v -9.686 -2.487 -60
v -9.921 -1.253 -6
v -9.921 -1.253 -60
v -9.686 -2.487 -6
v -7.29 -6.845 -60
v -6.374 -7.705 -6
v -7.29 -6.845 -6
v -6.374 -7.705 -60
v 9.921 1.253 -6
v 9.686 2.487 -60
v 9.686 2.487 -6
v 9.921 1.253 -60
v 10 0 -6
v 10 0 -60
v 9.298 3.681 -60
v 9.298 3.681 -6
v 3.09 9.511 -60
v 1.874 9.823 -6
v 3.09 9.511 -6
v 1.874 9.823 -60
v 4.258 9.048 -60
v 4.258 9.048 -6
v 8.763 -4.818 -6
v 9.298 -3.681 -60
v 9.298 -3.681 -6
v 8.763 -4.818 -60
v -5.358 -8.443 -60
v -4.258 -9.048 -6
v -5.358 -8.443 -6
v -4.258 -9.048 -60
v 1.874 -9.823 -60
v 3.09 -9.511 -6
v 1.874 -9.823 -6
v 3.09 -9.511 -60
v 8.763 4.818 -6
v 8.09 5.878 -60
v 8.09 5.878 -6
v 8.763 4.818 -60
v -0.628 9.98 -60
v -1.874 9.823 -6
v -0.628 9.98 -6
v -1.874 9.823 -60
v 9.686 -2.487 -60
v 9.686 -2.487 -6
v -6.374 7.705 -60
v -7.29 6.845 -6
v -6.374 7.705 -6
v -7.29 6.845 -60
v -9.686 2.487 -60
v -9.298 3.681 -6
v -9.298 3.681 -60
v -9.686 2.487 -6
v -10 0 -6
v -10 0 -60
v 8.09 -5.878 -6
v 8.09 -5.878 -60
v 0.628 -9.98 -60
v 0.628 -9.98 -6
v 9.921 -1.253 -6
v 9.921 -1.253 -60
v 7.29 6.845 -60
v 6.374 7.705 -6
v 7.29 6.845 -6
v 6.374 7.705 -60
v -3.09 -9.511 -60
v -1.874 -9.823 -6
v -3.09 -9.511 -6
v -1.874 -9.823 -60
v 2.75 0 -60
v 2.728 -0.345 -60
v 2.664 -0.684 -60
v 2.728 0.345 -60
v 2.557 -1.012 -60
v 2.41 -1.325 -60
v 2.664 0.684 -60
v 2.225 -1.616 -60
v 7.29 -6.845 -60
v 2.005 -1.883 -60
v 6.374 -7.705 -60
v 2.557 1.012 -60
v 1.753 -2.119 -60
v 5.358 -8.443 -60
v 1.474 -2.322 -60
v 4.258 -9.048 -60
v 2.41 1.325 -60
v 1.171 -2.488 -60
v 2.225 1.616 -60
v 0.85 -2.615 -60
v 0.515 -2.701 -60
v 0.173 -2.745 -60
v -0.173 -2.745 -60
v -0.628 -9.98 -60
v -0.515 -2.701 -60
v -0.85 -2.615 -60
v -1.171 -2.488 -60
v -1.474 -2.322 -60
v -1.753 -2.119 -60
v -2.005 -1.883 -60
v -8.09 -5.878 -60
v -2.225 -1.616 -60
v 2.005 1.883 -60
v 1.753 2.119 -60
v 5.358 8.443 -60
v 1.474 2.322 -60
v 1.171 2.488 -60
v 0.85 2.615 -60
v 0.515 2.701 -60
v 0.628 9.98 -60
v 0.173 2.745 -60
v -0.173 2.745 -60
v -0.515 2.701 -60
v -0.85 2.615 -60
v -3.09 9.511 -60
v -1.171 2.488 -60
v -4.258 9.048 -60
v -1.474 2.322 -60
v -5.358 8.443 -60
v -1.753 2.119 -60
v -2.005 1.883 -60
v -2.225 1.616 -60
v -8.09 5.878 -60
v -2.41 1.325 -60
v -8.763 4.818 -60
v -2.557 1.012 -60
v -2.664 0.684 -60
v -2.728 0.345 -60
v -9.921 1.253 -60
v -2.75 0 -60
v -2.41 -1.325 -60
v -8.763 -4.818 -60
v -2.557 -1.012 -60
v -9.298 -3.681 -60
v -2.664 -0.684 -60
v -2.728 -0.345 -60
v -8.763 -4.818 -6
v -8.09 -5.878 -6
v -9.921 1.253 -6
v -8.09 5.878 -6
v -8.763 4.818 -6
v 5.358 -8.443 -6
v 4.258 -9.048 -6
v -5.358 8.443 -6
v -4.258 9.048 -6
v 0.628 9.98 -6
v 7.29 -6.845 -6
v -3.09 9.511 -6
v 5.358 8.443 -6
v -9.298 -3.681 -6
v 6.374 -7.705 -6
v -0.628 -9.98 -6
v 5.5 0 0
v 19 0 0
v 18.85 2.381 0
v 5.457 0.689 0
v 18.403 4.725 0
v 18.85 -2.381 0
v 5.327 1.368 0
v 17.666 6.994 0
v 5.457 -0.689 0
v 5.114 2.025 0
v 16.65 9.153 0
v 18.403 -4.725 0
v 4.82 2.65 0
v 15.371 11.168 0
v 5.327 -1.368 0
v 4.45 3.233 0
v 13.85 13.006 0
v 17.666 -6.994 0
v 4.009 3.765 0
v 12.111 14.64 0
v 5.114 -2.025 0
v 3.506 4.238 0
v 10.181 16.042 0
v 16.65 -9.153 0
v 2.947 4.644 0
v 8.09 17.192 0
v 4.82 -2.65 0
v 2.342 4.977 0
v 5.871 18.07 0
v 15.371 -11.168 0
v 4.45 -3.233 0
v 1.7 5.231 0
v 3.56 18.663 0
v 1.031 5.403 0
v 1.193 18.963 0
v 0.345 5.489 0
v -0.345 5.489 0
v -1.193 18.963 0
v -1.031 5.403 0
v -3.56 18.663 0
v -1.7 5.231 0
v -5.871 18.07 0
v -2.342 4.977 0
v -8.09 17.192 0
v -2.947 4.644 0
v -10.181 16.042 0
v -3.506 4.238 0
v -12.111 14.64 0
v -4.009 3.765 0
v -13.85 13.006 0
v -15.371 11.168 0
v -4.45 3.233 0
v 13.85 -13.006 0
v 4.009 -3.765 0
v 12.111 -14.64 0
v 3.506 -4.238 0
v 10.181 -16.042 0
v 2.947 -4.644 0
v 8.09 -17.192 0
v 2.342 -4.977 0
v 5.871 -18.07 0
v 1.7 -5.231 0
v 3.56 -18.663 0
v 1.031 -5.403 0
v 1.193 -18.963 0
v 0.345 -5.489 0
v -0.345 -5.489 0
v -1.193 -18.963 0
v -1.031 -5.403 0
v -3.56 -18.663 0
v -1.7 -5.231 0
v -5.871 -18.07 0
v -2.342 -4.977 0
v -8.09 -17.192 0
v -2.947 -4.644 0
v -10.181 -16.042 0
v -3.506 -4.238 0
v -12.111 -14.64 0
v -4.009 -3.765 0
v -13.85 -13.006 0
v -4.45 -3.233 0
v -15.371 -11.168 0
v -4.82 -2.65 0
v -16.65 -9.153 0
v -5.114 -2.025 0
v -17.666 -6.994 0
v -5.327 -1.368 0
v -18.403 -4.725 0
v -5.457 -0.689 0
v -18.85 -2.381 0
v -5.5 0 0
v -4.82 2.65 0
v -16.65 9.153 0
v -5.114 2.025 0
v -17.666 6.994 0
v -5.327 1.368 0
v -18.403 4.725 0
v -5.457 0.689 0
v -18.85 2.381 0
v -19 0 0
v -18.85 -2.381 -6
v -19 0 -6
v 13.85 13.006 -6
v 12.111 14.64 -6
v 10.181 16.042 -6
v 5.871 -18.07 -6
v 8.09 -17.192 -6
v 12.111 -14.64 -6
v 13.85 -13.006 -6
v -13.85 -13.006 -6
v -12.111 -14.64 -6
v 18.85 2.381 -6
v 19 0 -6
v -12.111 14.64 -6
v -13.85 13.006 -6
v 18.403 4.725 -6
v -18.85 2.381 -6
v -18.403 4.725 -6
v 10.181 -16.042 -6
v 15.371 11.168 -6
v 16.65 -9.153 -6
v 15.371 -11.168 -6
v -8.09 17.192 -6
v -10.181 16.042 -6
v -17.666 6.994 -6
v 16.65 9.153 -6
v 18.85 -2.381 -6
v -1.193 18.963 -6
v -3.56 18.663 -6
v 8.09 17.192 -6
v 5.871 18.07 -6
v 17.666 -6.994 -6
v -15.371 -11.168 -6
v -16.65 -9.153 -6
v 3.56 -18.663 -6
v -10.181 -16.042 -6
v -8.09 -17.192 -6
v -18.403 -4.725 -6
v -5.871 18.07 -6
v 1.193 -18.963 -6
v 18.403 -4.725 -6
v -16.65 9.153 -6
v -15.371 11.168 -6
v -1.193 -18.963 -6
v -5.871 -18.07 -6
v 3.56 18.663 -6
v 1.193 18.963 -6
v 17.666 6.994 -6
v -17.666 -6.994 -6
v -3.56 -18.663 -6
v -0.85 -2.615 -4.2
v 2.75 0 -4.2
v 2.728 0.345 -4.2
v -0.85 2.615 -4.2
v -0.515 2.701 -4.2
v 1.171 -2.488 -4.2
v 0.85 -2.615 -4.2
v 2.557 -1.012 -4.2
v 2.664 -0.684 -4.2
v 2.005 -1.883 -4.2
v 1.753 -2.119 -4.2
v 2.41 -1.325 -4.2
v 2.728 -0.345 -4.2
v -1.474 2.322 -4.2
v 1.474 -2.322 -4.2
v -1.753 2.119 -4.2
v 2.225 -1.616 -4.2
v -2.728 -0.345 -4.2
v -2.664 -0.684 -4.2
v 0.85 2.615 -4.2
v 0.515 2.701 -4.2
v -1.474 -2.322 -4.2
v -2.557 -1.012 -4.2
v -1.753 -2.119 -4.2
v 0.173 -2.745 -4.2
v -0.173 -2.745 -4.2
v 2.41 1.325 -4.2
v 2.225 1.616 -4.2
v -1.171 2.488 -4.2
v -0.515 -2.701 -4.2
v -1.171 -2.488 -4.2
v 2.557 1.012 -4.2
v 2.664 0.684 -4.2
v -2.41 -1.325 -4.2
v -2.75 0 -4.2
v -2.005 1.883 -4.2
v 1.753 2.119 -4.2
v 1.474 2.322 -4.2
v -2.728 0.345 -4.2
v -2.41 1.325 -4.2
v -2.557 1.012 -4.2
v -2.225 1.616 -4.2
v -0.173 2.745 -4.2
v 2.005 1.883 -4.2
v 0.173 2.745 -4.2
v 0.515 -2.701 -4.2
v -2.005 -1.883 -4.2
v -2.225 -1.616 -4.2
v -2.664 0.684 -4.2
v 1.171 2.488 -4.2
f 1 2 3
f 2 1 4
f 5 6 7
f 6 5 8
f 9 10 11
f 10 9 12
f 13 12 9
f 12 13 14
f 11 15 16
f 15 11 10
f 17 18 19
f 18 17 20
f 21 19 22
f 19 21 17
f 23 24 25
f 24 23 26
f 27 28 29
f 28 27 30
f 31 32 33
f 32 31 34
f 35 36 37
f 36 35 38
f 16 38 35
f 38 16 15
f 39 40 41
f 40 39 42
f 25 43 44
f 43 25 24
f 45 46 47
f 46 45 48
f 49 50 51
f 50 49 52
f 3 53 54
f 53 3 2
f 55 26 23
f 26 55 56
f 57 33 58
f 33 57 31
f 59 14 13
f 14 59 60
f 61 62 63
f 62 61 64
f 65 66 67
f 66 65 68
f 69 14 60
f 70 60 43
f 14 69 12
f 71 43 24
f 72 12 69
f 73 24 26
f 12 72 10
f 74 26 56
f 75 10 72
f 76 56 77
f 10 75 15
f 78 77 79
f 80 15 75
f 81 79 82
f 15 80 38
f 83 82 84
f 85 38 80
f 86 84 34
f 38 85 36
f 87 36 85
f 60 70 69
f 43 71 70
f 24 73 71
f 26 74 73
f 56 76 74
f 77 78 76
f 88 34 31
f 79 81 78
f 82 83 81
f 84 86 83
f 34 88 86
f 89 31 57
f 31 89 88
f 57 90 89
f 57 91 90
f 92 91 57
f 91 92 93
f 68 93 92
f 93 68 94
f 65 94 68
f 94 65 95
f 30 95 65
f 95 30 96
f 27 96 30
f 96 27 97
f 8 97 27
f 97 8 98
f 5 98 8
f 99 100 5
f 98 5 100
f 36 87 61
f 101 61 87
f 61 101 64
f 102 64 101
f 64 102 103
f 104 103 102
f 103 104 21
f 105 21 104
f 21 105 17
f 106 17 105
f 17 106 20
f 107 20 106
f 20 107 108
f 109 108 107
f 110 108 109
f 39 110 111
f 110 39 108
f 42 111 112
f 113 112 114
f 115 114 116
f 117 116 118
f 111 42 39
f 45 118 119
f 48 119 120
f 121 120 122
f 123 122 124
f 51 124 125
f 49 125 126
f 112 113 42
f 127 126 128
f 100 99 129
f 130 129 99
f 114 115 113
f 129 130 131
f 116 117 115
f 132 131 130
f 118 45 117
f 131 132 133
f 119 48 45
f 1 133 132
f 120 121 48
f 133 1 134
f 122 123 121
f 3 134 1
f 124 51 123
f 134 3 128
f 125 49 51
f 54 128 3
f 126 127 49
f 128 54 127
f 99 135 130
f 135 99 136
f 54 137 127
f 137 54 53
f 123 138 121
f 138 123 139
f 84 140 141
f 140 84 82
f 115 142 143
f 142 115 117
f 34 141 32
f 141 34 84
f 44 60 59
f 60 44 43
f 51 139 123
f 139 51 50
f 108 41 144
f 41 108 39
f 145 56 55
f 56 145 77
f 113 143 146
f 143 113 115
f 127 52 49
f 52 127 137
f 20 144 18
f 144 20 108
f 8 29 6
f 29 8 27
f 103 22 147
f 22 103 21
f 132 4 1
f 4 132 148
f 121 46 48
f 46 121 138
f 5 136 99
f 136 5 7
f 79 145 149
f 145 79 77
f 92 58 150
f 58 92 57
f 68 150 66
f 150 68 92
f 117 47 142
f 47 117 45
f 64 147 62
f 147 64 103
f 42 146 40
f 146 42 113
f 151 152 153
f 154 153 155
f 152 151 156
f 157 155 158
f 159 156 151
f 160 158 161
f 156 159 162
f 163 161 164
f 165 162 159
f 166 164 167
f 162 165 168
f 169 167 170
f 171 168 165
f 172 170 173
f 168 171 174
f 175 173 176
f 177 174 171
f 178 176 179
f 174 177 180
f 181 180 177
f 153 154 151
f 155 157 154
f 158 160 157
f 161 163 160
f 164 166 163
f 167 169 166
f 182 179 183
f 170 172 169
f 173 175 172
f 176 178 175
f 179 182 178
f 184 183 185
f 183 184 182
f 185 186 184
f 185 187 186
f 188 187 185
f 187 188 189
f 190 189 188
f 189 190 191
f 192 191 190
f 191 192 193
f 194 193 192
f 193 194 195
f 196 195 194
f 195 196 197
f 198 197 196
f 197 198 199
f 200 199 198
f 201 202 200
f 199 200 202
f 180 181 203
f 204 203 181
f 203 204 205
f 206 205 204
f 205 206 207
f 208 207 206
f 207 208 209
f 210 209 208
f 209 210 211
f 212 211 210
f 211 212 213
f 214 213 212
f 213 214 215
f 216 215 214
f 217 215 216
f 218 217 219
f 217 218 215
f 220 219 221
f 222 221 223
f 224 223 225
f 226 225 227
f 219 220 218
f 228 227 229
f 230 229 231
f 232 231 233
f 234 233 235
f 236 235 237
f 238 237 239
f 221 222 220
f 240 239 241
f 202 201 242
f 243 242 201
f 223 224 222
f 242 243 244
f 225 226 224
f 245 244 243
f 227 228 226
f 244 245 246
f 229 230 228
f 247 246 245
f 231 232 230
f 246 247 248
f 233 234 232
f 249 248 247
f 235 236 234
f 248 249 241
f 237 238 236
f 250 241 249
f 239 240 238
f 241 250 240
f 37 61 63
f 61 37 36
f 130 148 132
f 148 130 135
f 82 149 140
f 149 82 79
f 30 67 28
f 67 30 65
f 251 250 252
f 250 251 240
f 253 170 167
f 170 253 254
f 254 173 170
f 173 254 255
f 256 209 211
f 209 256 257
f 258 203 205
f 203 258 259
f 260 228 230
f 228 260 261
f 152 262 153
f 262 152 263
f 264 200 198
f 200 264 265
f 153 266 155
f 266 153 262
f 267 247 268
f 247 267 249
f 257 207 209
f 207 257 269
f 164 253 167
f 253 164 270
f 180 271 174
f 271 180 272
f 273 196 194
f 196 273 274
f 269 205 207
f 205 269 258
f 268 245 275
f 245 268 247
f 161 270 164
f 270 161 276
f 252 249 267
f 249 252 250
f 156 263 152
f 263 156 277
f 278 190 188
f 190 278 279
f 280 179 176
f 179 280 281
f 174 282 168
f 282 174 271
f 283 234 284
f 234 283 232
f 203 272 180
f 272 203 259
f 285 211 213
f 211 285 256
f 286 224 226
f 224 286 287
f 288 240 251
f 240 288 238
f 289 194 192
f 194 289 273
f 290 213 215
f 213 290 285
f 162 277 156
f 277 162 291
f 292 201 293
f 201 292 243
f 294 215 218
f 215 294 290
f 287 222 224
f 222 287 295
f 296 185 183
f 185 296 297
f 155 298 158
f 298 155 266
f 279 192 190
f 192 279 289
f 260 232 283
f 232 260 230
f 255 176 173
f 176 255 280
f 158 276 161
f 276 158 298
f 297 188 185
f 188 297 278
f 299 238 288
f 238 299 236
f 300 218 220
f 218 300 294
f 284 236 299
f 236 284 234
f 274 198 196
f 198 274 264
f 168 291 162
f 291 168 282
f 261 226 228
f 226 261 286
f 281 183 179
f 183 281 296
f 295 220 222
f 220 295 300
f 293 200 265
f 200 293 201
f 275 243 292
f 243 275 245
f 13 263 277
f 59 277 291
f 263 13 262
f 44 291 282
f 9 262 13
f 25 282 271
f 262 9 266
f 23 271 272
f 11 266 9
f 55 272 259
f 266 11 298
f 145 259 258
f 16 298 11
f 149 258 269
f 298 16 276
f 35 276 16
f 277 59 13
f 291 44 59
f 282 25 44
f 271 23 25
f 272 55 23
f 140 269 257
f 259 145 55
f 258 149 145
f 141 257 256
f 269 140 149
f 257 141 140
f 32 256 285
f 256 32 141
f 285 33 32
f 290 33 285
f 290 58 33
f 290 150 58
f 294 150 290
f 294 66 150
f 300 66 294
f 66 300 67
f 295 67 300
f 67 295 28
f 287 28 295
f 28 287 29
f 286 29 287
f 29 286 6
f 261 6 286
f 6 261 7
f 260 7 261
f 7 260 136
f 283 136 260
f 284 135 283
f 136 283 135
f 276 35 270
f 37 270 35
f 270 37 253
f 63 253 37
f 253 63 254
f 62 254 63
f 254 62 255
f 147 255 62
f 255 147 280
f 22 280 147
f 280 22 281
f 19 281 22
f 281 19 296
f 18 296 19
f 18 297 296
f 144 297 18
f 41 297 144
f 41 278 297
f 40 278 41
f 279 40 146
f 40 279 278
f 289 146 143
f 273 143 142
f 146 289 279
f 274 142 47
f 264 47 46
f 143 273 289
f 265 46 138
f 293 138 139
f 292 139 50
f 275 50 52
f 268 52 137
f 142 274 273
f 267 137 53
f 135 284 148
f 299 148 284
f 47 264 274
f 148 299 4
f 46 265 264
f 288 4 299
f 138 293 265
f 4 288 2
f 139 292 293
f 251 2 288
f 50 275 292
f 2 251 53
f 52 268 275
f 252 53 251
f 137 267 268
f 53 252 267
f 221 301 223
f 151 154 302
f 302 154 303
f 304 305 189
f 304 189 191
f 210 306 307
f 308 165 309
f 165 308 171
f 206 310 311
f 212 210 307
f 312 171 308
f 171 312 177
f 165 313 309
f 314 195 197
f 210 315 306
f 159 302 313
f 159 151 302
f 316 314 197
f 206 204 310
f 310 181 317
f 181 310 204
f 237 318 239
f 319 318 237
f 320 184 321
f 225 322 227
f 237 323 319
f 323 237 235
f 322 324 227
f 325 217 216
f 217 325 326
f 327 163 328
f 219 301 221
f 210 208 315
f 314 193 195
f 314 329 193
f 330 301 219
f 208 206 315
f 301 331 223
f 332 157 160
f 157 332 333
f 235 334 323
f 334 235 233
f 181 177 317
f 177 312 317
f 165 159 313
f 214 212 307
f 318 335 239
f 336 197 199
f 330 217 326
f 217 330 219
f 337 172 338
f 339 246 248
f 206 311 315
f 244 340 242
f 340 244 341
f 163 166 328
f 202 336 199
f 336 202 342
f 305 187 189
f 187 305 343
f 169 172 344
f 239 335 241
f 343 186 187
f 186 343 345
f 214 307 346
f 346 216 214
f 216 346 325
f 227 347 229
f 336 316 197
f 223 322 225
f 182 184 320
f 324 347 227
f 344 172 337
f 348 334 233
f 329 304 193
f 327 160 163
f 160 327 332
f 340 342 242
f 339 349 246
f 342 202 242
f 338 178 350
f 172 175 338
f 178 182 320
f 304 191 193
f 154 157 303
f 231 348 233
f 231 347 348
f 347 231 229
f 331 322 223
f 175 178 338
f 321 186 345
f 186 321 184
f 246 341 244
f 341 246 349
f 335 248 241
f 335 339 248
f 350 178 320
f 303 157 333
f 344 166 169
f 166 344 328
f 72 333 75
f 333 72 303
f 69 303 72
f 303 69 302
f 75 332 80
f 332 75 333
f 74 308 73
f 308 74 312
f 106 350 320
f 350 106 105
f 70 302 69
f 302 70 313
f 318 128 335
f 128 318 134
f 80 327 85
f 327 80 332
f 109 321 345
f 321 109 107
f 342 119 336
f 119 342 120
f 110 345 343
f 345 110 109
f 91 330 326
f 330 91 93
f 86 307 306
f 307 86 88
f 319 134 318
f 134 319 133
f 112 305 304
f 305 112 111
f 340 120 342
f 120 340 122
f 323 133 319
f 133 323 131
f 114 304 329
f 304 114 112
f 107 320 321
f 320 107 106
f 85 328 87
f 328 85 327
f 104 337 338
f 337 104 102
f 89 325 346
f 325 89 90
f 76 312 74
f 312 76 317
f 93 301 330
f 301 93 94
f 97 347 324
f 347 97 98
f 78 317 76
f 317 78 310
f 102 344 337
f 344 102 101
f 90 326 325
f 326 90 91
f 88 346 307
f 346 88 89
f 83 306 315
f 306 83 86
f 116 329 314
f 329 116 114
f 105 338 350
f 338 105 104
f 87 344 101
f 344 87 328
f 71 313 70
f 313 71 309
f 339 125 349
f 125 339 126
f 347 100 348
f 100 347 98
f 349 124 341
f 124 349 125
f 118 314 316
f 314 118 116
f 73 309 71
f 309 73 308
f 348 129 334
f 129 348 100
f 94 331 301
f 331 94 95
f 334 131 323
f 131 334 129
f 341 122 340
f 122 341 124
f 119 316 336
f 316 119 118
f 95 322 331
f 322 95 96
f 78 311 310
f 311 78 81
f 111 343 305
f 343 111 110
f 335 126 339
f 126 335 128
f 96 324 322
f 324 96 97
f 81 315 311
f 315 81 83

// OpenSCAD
$fn = 50;


difference() {
	union() {
		translate(v = [0, 0, -60.0000000000]) {
			cylinder(h = 60, r = 10.0000000000);
		}
		translate(v = [0, 0, -6.0000000000]) {
			cylinder(h = 6, r = 19.0000000000);
		}
	}
	union() {
		translate(v = [0, 0, 0]) {
			rotate(a = [0, 0, 0]) {
				difference() {
					union() {
						#translate(v = [0, 0, -60.0000000000]) {
							cylinder(h = 60, r = 2.2500000000);
						}
						#translate(v = [0, 0, -4.2000000000]) {
							cylinder(h = 4.2000000000, r = 10.0000000000, r1 = 2.7500000000, r2 = 5.5000000000);
						}
						#translate(v = [0, 0, -60.0000000000]) {
							cylinder(h = 60, r = 2.7500000000);
						}
						#translate(v = [0, 0, -60.0000000000]) {
							cylinder(h = 60, r = 2.2500000000);
						}
					}
					union();
				}
			}
		}
	}
}
